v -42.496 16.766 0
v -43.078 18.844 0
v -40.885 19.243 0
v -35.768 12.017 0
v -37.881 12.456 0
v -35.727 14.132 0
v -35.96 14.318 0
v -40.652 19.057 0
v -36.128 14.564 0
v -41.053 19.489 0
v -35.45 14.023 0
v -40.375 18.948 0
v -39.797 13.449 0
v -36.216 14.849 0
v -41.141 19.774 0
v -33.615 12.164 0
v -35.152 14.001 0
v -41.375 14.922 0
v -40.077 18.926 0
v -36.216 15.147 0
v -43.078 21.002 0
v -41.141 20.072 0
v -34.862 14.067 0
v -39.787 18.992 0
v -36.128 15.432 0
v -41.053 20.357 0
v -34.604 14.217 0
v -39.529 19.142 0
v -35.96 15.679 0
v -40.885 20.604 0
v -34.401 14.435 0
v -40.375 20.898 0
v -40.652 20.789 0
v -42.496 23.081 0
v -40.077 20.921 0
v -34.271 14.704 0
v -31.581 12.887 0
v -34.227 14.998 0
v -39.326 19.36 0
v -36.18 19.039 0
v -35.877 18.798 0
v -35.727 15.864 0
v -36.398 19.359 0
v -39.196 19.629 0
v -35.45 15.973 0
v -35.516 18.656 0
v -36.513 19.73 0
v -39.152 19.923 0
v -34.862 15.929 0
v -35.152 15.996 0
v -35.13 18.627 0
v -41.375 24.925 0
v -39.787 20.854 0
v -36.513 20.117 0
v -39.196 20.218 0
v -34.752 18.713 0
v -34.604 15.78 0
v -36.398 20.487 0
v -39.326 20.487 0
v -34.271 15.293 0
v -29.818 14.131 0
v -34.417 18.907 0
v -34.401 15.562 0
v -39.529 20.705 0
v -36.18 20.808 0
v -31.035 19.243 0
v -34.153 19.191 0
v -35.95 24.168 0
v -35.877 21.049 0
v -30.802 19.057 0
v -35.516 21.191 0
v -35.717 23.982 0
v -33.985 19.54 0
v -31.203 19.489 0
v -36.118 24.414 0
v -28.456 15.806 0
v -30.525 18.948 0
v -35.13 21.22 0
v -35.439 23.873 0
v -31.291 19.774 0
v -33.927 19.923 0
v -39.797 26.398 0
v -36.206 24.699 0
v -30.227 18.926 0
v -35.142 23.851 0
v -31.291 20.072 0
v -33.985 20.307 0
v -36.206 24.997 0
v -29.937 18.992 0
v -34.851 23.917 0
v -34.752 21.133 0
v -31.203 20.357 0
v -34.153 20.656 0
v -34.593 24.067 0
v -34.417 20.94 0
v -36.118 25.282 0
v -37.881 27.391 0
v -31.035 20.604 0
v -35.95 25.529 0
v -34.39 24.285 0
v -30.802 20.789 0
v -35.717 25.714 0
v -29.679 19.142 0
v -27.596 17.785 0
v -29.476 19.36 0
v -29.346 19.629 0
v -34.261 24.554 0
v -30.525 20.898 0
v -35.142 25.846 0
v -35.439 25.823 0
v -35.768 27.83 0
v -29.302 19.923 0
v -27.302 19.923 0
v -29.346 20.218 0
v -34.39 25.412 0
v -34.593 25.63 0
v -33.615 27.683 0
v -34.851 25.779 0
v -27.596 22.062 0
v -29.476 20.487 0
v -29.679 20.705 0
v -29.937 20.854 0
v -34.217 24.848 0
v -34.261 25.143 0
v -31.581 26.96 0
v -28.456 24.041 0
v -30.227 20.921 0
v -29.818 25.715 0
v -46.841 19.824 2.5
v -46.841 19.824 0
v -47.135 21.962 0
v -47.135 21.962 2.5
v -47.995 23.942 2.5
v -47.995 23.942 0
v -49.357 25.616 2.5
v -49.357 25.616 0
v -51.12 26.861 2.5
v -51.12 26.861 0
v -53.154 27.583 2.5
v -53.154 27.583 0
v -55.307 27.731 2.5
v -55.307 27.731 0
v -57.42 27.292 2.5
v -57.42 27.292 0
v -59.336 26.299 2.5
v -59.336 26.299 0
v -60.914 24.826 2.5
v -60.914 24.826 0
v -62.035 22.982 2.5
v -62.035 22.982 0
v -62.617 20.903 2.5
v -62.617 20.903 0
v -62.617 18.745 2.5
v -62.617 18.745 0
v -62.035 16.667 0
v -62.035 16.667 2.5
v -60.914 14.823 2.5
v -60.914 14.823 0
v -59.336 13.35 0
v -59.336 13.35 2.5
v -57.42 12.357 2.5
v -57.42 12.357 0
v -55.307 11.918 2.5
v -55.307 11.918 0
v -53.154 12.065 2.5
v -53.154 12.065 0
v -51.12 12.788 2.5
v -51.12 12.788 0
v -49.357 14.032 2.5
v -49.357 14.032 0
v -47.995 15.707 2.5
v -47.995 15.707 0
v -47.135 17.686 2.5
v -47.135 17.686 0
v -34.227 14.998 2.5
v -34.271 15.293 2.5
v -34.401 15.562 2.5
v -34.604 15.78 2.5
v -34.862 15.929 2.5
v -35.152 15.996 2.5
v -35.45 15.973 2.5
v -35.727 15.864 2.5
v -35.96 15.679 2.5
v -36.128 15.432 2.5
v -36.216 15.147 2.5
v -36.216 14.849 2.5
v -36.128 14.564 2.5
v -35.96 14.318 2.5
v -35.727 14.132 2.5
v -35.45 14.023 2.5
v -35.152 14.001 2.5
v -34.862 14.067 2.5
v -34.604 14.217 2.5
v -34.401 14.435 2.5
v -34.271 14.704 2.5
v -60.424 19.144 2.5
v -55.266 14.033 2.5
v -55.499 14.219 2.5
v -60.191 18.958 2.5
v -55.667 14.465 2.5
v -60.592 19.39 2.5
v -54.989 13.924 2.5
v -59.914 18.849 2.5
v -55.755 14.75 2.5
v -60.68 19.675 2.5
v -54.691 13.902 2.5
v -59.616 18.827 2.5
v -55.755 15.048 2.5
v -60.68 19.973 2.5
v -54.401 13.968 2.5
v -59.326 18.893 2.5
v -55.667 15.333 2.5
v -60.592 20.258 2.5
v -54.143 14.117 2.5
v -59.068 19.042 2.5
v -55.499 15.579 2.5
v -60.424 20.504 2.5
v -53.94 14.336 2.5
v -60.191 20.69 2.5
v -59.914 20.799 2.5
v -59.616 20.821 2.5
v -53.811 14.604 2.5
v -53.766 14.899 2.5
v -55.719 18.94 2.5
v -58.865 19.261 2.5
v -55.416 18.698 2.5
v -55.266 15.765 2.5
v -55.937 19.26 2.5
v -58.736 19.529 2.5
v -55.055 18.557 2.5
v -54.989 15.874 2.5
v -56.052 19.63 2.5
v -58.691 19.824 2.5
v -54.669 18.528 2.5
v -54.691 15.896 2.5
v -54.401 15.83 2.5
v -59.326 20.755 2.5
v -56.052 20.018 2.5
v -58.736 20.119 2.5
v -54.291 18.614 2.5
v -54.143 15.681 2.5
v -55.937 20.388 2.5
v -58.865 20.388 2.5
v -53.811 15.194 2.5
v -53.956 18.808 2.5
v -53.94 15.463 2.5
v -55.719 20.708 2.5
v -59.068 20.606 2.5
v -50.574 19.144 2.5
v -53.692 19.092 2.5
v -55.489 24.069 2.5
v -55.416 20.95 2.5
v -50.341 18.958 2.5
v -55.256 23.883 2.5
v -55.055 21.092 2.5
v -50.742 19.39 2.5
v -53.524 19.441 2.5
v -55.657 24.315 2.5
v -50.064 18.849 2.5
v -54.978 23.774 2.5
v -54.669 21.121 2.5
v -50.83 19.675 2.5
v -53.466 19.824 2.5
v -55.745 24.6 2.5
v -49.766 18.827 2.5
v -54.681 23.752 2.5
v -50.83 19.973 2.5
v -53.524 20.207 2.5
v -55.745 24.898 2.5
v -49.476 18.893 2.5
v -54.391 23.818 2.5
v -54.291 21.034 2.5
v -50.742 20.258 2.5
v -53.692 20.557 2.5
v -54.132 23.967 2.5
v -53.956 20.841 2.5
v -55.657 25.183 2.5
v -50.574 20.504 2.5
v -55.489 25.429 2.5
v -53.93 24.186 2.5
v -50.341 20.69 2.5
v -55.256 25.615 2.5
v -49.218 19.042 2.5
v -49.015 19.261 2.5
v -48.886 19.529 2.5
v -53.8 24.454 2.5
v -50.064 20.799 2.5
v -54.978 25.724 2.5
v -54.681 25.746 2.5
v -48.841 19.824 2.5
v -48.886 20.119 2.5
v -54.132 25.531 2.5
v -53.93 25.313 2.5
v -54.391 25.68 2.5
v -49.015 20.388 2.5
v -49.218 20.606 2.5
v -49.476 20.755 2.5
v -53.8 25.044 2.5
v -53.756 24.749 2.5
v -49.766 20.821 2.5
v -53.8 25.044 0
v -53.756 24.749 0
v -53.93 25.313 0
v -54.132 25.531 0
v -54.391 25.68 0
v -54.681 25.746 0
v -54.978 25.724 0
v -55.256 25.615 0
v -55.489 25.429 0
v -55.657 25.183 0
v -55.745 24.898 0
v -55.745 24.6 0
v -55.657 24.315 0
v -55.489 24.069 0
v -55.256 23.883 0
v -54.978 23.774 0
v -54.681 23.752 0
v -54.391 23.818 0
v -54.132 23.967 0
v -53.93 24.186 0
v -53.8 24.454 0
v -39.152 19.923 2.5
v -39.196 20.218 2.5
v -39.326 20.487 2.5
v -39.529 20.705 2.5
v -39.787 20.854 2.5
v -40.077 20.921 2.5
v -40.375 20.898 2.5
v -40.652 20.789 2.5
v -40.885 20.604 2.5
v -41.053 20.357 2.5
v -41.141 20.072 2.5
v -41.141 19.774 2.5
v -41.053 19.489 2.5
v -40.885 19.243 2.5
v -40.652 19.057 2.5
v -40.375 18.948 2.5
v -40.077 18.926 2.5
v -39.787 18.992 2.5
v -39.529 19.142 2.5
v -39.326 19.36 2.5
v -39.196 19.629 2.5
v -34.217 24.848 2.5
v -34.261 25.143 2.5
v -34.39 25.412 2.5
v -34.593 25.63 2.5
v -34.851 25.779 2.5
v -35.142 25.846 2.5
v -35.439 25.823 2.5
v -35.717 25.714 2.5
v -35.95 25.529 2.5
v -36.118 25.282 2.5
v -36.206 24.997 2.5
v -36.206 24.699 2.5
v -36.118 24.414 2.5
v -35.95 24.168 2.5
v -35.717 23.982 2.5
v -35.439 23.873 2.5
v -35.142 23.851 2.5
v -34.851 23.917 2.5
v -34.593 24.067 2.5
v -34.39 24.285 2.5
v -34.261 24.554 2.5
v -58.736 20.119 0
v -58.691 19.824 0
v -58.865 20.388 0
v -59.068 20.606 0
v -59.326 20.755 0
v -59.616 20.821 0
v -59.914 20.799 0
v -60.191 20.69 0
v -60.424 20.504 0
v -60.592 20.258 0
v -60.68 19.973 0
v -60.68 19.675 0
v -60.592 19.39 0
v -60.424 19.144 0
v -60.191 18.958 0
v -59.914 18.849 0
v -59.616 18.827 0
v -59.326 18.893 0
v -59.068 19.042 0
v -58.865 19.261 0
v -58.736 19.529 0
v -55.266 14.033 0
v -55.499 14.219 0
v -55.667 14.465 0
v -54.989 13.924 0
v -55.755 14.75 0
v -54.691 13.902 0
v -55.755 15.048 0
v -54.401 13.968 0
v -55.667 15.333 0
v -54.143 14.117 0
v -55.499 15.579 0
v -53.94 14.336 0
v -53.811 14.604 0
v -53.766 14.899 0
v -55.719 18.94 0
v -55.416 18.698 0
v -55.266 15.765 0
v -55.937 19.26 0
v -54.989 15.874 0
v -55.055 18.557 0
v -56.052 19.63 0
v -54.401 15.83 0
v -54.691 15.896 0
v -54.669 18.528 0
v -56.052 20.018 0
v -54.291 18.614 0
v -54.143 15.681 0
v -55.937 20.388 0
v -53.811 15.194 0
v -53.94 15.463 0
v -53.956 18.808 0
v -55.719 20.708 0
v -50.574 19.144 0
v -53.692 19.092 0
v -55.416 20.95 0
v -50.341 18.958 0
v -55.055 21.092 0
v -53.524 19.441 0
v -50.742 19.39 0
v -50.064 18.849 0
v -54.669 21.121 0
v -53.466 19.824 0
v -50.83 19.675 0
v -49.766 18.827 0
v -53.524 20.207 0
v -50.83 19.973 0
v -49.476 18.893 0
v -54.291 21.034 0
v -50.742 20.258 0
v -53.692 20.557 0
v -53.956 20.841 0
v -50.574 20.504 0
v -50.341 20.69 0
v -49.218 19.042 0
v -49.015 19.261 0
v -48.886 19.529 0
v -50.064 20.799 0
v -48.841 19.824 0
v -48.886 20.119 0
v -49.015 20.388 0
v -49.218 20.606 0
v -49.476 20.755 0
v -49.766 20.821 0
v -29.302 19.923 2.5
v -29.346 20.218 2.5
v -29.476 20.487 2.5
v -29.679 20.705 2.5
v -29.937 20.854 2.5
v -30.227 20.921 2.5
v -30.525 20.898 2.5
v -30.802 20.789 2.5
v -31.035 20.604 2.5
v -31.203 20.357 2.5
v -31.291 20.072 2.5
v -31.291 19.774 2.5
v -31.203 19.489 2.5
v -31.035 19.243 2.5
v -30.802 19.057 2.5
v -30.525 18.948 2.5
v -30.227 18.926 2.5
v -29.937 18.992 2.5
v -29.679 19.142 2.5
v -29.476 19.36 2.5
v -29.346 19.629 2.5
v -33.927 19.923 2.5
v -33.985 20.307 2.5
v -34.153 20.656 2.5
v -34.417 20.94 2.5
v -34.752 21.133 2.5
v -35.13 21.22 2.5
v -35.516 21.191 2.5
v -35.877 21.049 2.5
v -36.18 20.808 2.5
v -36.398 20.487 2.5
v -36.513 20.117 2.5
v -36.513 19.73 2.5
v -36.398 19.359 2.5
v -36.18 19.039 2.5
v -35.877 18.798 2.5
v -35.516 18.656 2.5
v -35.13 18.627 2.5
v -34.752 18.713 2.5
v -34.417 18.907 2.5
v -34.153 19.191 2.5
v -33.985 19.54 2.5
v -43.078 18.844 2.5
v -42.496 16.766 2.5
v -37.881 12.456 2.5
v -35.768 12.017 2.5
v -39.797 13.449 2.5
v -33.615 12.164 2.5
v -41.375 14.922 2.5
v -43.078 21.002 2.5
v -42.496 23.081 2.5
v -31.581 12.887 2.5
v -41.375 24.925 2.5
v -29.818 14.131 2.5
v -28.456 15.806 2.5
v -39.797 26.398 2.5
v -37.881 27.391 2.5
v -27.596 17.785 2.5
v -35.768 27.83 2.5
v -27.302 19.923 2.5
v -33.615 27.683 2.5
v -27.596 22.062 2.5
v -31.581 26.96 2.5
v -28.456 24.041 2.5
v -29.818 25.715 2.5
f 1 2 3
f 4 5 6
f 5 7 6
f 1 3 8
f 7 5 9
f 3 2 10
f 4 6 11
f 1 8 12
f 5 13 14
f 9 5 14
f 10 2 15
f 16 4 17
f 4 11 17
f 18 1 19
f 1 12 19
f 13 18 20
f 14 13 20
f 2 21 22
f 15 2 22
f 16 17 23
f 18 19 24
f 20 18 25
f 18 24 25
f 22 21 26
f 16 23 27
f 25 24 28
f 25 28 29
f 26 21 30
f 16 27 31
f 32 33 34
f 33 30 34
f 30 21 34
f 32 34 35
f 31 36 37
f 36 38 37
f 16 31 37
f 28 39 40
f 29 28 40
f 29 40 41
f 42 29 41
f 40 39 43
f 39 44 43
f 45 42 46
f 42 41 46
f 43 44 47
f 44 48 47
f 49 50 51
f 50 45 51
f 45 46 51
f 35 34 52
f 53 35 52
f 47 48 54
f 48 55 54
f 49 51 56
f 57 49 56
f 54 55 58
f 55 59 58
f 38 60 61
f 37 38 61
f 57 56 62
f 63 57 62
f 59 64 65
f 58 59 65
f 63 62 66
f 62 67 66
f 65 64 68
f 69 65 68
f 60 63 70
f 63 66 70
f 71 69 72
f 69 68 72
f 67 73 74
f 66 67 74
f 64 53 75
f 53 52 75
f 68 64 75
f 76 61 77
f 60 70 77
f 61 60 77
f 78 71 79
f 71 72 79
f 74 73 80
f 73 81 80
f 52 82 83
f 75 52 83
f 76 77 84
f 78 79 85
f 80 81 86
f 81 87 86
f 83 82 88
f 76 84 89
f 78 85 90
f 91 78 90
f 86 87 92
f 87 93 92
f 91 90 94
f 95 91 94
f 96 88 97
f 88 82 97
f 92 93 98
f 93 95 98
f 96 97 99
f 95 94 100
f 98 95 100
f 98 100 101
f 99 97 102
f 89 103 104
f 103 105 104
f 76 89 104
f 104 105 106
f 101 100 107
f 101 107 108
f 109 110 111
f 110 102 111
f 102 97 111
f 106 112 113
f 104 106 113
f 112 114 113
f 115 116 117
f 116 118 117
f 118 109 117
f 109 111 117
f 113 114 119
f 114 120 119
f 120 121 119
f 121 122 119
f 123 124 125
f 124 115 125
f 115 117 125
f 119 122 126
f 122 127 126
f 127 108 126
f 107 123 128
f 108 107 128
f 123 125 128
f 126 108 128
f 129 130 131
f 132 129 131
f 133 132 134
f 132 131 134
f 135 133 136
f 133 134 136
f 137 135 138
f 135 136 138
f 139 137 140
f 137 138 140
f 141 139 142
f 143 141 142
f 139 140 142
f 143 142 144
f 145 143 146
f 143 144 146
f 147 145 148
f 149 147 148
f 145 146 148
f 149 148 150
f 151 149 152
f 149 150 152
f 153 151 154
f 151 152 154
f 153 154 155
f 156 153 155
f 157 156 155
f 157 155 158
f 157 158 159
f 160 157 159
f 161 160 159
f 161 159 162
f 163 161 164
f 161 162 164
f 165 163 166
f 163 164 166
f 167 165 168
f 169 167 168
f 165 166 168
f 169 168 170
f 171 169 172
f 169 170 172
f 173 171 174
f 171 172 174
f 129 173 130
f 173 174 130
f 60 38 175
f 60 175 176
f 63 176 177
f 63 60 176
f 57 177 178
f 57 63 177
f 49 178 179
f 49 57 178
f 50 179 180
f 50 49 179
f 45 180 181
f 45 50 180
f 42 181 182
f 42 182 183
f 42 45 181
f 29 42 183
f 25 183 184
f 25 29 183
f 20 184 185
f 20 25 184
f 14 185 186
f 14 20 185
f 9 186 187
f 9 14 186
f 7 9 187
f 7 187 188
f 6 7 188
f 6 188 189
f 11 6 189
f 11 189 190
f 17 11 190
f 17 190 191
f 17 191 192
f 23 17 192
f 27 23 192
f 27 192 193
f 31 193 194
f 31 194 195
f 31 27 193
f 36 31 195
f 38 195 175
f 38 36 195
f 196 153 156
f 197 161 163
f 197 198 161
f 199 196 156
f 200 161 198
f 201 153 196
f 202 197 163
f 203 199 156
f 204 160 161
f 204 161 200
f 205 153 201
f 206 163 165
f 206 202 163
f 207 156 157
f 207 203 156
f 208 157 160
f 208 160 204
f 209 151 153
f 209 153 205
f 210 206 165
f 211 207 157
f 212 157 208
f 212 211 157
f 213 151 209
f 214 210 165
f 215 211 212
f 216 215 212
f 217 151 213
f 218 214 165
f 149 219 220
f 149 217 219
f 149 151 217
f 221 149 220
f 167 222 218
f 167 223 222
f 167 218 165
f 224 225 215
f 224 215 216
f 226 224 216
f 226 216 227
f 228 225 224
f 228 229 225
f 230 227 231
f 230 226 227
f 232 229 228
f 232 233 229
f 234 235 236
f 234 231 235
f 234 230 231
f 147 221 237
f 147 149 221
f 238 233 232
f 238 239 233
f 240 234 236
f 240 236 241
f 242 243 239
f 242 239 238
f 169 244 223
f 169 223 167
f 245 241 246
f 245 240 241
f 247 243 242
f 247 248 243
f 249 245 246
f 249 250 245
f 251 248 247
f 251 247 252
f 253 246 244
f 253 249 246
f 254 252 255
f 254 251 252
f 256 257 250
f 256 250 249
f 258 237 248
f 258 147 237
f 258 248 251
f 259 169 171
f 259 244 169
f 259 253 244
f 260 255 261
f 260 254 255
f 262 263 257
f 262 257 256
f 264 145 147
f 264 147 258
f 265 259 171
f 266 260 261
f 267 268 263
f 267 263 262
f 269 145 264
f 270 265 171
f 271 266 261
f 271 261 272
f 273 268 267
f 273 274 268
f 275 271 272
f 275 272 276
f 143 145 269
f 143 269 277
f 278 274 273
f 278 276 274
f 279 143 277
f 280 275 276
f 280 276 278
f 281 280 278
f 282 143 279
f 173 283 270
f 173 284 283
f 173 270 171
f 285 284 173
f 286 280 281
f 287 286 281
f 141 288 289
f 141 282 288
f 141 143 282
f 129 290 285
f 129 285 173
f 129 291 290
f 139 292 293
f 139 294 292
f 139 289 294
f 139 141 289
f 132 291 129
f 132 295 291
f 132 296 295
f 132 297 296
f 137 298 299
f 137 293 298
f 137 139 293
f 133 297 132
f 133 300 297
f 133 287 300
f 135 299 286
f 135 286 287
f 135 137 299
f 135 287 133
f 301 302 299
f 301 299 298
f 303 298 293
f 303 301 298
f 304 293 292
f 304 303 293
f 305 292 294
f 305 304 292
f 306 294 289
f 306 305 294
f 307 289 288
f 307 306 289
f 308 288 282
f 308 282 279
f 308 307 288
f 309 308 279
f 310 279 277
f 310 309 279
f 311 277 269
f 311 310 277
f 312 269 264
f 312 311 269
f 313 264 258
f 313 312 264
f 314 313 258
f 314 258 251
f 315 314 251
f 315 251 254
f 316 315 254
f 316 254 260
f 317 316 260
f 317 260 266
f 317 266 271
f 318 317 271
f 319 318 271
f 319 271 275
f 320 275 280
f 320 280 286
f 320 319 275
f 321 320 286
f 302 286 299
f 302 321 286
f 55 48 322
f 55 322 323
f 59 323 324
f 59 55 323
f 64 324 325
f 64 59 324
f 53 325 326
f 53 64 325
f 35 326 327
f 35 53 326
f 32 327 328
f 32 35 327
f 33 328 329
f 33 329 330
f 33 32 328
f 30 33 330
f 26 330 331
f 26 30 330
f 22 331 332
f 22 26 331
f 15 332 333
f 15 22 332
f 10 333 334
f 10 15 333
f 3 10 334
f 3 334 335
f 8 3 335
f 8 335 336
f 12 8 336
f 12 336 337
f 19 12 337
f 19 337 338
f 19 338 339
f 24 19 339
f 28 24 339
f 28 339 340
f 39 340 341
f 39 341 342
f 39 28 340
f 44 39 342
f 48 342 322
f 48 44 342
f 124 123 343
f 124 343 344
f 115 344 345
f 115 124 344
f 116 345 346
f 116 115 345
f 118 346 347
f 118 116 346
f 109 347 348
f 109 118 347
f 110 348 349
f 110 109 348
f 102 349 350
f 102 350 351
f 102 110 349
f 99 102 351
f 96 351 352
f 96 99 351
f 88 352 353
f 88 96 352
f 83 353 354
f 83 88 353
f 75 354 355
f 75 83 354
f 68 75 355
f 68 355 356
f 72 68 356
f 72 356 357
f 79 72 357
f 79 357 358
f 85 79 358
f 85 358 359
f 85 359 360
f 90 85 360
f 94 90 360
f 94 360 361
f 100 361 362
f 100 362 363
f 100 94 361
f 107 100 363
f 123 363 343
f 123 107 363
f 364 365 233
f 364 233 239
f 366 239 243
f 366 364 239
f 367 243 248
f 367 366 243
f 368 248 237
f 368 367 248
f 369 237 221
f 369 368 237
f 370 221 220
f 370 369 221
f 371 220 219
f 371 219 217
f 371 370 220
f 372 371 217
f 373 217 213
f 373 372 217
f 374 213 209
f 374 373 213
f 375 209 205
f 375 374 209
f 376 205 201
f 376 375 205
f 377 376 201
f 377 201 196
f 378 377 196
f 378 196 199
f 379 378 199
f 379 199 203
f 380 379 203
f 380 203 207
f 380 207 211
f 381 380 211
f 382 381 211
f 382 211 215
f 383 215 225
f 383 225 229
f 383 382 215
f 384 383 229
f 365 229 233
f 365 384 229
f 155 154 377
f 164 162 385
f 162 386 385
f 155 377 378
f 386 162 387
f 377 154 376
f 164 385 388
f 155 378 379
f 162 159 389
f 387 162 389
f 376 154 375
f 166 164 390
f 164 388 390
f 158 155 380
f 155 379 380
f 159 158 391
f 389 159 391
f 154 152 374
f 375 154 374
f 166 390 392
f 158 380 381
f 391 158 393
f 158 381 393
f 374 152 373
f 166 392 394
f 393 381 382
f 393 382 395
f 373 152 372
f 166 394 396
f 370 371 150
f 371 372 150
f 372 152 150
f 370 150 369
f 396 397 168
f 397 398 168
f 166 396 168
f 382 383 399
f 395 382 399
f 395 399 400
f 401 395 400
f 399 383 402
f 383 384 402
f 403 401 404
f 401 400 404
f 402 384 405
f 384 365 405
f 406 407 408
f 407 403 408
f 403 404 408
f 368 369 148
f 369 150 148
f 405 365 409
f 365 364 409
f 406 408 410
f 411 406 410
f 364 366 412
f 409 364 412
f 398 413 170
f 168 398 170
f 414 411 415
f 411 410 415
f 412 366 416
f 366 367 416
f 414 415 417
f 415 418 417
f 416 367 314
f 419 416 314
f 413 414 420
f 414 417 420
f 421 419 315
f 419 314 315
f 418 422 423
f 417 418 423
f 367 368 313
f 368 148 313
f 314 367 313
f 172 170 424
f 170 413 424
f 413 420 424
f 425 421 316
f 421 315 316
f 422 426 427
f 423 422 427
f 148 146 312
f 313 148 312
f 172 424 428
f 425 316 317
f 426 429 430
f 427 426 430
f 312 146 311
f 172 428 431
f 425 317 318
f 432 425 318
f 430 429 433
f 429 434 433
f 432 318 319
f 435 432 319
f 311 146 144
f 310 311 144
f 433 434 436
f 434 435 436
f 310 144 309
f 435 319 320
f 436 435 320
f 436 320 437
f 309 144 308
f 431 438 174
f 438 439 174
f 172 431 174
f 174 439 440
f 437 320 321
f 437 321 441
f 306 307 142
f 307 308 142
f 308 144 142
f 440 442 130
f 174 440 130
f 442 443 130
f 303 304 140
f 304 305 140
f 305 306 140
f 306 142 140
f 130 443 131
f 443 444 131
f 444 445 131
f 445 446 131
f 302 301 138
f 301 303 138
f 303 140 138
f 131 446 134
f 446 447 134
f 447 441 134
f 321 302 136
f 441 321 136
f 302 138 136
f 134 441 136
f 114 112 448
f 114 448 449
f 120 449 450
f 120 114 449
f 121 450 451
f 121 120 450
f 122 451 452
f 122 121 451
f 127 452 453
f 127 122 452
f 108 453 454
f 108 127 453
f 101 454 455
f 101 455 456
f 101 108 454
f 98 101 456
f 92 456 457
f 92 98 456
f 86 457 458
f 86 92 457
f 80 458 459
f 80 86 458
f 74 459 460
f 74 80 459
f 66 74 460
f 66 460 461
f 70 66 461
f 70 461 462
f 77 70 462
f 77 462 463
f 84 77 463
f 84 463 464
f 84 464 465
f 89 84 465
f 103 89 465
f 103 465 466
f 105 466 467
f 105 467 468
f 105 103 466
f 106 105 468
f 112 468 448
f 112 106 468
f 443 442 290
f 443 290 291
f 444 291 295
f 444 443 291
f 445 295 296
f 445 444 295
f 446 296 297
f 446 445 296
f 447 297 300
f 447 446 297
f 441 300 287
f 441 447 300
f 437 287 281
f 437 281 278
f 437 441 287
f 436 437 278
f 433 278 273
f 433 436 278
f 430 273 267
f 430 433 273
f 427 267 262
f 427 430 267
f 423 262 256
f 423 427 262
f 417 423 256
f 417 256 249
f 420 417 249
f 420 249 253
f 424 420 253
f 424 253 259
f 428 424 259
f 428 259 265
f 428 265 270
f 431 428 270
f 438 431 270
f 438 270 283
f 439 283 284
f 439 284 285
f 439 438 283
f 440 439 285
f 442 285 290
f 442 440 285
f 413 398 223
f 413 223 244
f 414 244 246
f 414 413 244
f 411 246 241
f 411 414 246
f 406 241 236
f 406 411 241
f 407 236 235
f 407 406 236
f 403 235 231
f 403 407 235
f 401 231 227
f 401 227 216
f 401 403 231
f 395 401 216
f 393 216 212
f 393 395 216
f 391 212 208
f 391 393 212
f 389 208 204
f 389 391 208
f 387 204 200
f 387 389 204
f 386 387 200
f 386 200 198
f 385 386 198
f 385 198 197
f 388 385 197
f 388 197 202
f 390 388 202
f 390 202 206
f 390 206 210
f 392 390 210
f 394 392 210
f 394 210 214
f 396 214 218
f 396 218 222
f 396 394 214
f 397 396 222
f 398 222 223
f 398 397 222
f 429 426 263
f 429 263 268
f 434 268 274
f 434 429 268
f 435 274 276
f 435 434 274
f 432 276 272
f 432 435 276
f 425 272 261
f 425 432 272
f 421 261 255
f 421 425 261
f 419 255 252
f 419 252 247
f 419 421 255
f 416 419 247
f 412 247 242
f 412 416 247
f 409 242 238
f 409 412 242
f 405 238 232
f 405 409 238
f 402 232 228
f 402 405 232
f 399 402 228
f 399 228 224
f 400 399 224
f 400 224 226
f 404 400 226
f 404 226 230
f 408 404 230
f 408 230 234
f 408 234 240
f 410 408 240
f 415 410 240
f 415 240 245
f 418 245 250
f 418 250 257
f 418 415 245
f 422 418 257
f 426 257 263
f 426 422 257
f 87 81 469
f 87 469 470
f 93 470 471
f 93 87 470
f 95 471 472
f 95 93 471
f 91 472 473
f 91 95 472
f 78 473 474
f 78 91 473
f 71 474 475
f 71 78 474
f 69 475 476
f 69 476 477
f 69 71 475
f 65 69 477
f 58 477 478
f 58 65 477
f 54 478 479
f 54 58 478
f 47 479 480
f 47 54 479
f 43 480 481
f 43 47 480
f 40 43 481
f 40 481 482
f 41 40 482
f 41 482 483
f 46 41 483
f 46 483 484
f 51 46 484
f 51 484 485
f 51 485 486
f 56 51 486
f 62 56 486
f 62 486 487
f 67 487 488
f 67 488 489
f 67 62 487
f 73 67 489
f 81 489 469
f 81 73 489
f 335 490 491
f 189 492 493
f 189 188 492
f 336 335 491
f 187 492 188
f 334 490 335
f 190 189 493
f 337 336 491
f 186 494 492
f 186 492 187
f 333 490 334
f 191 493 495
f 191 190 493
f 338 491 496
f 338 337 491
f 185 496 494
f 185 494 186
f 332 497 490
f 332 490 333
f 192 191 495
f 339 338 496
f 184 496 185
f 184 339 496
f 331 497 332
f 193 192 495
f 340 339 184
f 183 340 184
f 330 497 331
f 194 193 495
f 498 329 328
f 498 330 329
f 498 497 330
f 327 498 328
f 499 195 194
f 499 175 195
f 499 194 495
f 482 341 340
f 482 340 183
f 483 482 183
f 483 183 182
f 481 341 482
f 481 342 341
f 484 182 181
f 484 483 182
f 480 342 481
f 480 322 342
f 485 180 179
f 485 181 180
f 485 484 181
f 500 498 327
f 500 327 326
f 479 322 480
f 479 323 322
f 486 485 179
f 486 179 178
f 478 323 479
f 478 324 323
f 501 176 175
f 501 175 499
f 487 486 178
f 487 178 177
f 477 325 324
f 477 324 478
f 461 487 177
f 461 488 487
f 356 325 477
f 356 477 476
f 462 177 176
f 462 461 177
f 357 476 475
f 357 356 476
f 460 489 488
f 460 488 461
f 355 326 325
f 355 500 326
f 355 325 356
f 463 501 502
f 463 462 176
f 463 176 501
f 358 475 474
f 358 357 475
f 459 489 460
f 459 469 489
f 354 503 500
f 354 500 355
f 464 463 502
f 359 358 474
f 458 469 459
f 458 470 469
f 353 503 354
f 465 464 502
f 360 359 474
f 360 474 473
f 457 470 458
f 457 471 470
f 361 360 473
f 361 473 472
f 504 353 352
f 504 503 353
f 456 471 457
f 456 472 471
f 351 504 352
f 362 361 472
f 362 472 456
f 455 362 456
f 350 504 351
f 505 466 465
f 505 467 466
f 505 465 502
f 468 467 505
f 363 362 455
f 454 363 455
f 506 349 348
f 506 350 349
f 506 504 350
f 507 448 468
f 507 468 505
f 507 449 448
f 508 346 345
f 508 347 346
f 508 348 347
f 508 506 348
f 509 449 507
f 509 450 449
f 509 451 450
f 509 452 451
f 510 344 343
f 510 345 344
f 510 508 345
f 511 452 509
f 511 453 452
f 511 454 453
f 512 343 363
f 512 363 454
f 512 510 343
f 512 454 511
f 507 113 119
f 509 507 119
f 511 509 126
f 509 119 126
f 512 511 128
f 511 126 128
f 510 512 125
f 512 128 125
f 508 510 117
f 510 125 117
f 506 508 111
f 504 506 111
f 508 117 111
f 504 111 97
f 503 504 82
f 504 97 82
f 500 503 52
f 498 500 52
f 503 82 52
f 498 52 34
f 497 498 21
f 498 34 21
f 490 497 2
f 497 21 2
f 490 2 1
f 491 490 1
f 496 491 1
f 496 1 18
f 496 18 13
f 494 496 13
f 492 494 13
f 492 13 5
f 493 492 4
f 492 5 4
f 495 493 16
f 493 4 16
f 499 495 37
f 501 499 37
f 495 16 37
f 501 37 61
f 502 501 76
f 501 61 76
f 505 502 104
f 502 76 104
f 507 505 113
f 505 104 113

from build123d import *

# Parameters (mm, degrees)
F0_R     = 7.925
F0_R_2   = 1
F0_R_3   = 1.3
F1_DEPTH = 2.5


with BuildPart() as f1:
    # F0 (on Top) → F1 (new body)
    with BuildSketch(Plane.XY):
        with Locations((-54.766204, 19.824224)):
            Circle(F0_R)
        with Locations((-54.766204, 14.899224)):
            Circle(F0_R_2, mode=Mode.SUBTRACT)
        with Locations((-59.691204, 19.824224)):
            Circle(F0_R_2, mode=Mode.SUBTRACT)
        with Locations((-54.766204, 19.824224)):
            Circle(F0_R_3, mode=Mode.SUBTRACT)
        with Locations((-49.841204, 19.824224)):
            Circle(F0_R_2, mode=Mode.SUBTRACT)
        with Locations((-54.755844, 24.749213)):
            Circle(F0_R_2, mode=Mode.SUBTRACT)
        with Locations((-35.227058, 19.923363)):
            Circle(F0_R)
        with Locations((-35.227058, 14.998363)):
            Circle(F0_R_2, mode=Mode.SUBTRACT)
        with Locations((-40.152058, 19.923363)):
            Circle(F0_R_2, mode=Mode.SUBTRACT)
        with Locations((-35.227058, 19.923363)):
            Circle(F0_R_3, mode=Mode.SUBTRACT)
        with Locations((-30.302058, 19.923363)):
            Circle(F0_R_2, mode=Mode.SUBTRACT)
        with Locations((-35.216699, 24.848352)):
            Circle(F0_R_2, mode=Mode.SUBTRACT)
    extrude(amount=F1_DEPTH)


solid = f1.part
